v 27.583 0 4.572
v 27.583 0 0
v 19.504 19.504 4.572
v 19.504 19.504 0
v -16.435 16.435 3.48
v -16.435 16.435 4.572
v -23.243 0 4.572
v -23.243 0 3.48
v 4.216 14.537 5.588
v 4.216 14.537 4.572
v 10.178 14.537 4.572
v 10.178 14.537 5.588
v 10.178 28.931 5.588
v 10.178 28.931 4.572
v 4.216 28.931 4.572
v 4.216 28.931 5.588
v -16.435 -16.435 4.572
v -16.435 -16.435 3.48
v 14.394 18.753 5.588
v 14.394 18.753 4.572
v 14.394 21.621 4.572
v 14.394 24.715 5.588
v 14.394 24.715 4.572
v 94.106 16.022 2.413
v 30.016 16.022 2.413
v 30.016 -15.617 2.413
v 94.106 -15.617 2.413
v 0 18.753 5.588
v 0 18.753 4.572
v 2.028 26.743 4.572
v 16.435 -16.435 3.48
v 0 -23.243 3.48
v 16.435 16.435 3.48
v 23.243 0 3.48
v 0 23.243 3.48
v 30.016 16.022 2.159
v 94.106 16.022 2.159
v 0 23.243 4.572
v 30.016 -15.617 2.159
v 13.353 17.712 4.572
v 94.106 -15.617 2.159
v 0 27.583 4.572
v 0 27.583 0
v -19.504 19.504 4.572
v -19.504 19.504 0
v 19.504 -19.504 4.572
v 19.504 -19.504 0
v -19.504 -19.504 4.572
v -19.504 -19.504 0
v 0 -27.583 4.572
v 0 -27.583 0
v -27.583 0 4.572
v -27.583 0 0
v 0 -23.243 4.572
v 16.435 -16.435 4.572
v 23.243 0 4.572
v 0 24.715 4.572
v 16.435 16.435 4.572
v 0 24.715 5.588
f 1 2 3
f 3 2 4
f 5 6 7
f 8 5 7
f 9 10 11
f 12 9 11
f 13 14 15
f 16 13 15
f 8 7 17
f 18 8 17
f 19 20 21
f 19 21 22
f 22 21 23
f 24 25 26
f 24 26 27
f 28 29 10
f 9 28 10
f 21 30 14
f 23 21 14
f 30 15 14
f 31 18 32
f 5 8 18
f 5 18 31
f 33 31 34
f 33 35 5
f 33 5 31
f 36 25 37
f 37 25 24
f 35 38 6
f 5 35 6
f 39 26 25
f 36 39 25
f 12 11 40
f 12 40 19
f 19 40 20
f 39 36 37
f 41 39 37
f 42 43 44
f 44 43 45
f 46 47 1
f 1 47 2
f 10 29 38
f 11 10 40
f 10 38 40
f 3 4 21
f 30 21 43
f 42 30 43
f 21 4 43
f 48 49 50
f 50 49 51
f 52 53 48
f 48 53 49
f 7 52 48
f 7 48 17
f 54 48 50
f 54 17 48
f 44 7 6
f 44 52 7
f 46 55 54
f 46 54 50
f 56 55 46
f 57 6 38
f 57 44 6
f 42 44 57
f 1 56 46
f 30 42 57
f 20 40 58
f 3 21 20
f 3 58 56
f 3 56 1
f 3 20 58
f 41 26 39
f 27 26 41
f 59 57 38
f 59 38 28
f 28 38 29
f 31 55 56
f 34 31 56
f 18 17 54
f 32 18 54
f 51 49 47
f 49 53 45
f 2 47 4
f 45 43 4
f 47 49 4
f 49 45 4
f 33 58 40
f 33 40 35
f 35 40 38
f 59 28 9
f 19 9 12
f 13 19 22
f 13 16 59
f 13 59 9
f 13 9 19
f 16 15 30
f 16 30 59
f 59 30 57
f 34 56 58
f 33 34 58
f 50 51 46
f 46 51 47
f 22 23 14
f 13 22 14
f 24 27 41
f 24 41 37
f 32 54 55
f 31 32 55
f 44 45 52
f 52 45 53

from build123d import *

# Parameters (mm, degrees)
F1_DEPTH = 4.572
F3_DEPTH = 1.0922
F5_W     = 64.089127
F5_H     = 31.638936
F6_DEPTH = 0.127
F8_DEPTH = 1.016


with BuildPart() as f1:
    # F0 (on Top) → F1 (new body)
    with BuildSketch(Plane.XY):
        Polygon((0, -27.582662), (19.503887, -19.503887), (27.582662, 0), (19.503887, 19.503887), (0, 27.582662), (-19.503887, 19.503887), (-27.582662, 0), (-19.503887, -19.503887), align=None)
    extrude(amount=F1_DEPTH)

    # F2 (on face) → F3 (cut)
    with BuildSketch(Plane.XY.offset(4.572)):
        Polygon((0, -23.243293), (16.43549, -16.43549), (23.243293, 0), (16.43549, 16.43549), (0, 23.243293), (-16.43549, 16.43549), (-23.243293, 0), (-16.43549, -16.43549), align=None)
    extrude(amount=-F3_DEPTH, mode=Mode.SUBTRACT)

    # F7 (on face) → F8 (join)
    with BuildSketch(Plane.XY.offset(4.572)):
        Polygon((4.215811, 14.537216), (10.177869, 14.537216), (14.39368, 18.753027), (14.39368, 24.715085), (10.177869, 28.930896), (4.215811, 28.930896), (0, 24.715085), (0, 18.753027), align=None)
    extrude(amount=F8_DEPTH)


with BuildPart() as f6:
    # F5 (on offset) → F6 (new body, symmetric)
    with BuildSketch(Plane.XY.offset(2.286)):
        with Locations((62.060986, 0.202814)):
            Rectangle(F5_W, F5_H)
    extrude(amount=F6_DEPTH, both=True)


solid = Compound([f1.part, f6.part])
